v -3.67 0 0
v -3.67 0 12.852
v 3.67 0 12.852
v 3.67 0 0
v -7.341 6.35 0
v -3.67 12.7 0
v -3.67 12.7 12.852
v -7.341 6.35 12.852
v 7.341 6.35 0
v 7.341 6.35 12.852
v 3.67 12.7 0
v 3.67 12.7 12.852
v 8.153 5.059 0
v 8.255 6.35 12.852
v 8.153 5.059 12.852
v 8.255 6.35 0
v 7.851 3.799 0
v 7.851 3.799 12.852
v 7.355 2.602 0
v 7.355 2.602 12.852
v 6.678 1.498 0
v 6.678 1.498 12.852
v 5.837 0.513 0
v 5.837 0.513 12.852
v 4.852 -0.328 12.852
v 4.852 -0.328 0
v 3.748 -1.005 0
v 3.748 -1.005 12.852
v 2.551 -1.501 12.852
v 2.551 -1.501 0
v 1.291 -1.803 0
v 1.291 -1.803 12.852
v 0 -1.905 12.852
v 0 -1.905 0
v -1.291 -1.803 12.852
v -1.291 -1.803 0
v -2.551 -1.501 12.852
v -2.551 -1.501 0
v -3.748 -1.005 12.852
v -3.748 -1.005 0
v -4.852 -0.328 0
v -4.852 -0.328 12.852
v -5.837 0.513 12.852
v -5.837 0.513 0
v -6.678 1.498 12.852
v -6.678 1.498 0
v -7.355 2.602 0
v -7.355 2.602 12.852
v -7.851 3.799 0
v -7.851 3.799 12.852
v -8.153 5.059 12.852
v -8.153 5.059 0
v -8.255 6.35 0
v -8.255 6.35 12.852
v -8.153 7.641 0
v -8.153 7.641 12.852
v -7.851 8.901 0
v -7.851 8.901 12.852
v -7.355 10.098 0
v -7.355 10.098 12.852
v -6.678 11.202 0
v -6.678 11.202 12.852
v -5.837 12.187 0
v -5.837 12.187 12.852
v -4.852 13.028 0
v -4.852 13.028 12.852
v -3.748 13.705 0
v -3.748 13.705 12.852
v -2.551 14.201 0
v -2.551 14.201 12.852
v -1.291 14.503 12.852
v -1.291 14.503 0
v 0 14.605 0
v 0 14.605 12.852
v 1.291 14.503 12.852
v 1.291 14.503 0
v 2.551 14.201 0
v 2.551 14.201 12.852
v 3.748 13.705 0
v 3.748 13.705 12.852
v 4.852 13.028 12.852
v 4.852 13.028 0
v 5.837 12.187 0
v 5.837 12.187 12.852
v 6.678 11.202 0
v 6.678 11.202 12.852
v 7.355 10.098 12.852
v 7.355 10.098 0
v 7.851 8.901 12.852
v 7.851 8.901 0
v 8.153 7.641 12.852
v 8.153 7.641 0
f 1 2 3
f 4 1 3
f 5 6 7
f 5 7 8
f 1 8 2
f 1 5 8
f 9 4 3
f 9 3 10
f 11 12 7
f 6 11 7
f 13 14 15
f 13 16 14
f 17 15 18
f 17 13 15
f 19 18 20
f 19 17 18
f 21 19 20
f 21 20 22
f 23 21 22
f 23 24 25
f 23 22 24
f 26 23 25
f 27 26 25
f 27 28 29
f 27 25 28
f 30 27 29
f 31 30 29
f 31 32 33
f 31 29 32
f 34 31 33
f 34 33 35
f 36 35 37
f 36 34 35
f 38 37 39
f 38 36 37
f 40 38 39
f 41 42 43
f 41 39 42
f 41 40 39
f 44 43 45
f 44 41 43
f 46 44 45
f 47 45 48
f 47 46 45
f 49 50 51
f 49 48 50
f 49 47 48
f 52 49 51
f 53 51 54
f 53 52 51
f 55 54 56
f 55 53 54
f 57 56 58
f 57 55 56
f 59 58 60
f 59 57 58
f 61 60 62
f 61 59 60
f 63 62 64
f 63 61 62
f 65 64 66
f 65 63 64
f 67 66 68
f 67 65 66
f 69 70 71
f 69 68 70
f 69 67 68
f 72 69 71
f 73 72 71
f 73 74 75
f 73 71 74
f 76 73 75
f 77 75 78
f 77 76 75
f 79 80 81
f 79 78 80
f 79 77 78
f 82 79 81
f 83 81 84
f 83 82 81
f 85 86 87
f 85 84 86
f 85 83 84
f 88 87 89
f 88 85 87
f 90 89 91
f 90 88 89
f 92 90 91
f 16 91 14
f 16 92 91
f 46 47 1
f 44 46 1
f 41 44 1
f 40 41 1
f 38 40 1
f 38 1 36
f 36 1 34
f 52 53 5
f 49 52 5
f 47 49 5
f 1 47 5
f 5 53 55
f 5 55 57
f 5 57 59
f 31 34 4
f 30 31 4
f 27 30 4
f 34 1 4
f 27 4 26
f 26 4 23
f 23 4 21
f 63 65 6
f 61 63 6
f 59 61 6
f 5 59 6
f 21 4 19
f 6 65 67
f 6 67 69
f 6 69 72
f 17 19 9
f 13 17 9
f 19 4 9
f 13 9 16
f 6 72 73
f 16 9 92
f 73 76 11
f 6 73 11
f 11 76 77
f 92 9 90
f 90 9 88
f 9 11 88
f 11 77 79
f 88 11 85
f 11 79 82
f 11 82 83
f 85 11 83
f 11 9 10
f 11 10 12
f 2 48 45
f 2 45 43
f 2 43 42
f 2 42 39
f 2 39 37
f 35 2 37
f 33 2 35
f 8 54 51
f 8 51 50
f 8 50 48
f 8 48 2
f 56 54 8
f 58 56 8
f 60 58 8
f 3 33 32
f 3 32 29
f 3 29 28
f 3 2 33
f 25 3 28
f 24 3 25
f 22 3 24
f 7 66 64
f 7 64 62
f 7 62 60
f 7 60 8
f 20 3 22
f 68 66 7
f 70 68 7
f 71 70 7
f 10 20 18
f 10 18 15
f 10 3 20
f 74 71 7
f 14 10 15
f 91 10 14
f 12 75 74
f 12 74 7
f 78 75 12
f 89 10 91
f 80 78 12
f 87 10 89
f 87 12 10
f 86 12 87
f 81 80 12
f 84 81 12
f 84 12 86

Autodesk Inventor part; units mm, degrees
ref_plane "YZ Plane" through (0, 0, 0) normal (1, 0, 0) x (0, 1, 0)
ref_plane "XZ Plane" through (0, 0, 0) normal (0, 1, 0) x (-1, 0, 0)
ref_plane "XY Plane" through (0, 0, 0) normal (0, 0, 1) x (1, 0, 0)
sketch "Sketch2" plane through (0, 0, 0) normal (0, 0, 1) x (1, 0, 0)
  line L0 (0, 12.7) -> (3.6703, 12.7)
  line L1 (0, 12.7) -> (-3.6703, 12.7)
  line L2 (0, 0) -> (3.6703, 0)
  line L3 (0, 0) -> (-3.6703, 0)
  line L4 (-3.6703, 0) -> (-7.3406, 6.35)
  line L5 (-7.3406, 6.35) -> (-3.6703, 12.7)
  line L6 (3.6703, 12.7) -> (7.3406, 6.35)
  line L7 (7.3406, 6.35) -> (3.6703, 0)
  line L8 (0, 0) -> (0, 6.35)
  circle A0 centre (0, 6.35) radius 8.255
  dimension "d11" = 6.35
  dimension "d12" = 16.51
extrude "Extrusion2" add sketch "Sketch2" along normal blind 6.223
sketch "Sketch3" plane through (0, 6.35, 6.223) normal (0, 0, 1) x (1, 0, 0)
  line L0 (-3.6703, -6.35) -> (-7.3406, 0) projected
  line L1 (-7.3406, 0) -> (-3.6703, 6.35) projected
  line L2 (-3.6703, 6.35) -> (3.6703, 6.35) projected
  line L3 (3.6703, 6.35) -> (7.3406, 0) projected
  line L4 (7.3406, 0) -> (3.6703, -6.35) projected
  line L5 (3.6703, -6.35) -> (-3.6703, -6.35) projected
  circle A0 centre (0, 0) radius 8.255 projected
  point P0 (0, -6.35)
extrude "Extrusion3" add sketch "Sketch3" along normal blind 3.302
sketch "Sketch4" plane through (0, 6.35, 9.525) normal (0, 0, 1) x (1, 0, 0)
  line L0 (-7.3406, 0) -> (-3.6703, 6.35) projected
  line L1 (-3.6703, 6.35) -> (3.6703, 6.35) projected
  line L2 (3.6703, 6.35) -> (7.3406, 0) projected
  line L3 (7.3406, 0) -> (3.6703, -6.35) projected
  line L4 (3.6703, -6.35) -> (-3.6703, -6.35) projected
  line L5 (-3.6703, -6.35) -> (-7.3406, 0) projected
  circle A0 centre (0, 0) radius 8.255 projected
  point P0 (0, -6.35)
extrude "Extrusion4" add sketch "Sketch4" along normal blind 6.5786
sketch "Sketch5" plane through (0, 6.35, 16.1036) normal (0, 0, 1) x (1, 0, 0)
  line L0 (-16.3467, 15.7745) -> (15.1254, 15.7745)
  line L1 (15.1254, 15.7745) -> (15.1254, -12.8793)
  line L2 (15.1254, -12.8793) -> (-16.3467, -12.8793)
  line L3 (-16.3467, -12.8793) -> (-16.3467, 15.7745)
  point P0 (0, -6.35)
extrude "Extrusion5" cut sketch "Sketch5" against normal blind 6.5786
sketch "Sketch8" plane through (0, 6.35, 9.525) normal (0, 0, 1) x (1, 0, 0)
  line L0 (-7.3406, 0) -> (-3.6703, -6.35) projected
  line L1 (-3.6703, 6.35) -> (-7.3406, 0) projected
  line L2 (3.6703, 6.35) -> (-3.6703, 6.35) projected
  line L3 (7.3406, 0) -> (3.6703, 6.35) projected
  line L4 (3.6703, -6.35) -> (7.3406, 0) projected
  line L5 (-3.6703, -6.35) -> (3.6703, -6.35) projected
  circle A0 centre (0, 0) radius 8.255 projected
  point P0 (0, -6.35)
extrude "Extrusion7" add sketch "Sketch8" along normal blind 15.875
sketch "Sketch9" plane through (0, 6.35, 25.4) normal (0, 0, 1) x (1, 0, 0)
  line L0 (-7.3406, 0) -> (-3.6703, 6.35) projected
  line L1 (-3.6703, 6.35) -> (3.6703, 6.35) projected
  line L2 (3.6703, 6.35) -> (7.3406, 0) projected
  line L3 (7.3406, 0) -> (3.6703, -6.35) projected
  line L4 (3.6703, -6.35) -> (-3.6703, -6.35) projected
  line L5 (-3.6703, -6.35) -> (-7.3406, 0) projected
  circle A0 centre (0, 0) radius 8.255 projected
  point P0 (0, -6.35)
extrude "Extrusion8" cut sketch "Sketch9" against normal blind 21.7424
sketch "Sketch10" plane through (0, 6.35, 3.6576) normal (0, 0, 1) x (1, 0, 0)
  line L0 (-7.3406, 0) -> (-3.6703, -6.35) projected
  line L1 (-3.6703, 6.35) -> (-7.3406, 0) projected
  line L2 (3.6703, 6.35) -> (-3.6703, 6.35) projected
  line L3 (7.3406, 0) -> (3.6703, 6.35) projected
  line L4 (3.6703, -6.35) -> (7.3406, 0) projected
  line L5 (-3.6703, -6.35) -> (3.6703, -6.35) projected
  circle A0 centre (0, 0) radius 8.255 projected
  point P0 (0, -6.35)
extrude "Extrusion9" add sketch "Sketch10" along normal blind 9.1948
properties part number ".506Spacer"
